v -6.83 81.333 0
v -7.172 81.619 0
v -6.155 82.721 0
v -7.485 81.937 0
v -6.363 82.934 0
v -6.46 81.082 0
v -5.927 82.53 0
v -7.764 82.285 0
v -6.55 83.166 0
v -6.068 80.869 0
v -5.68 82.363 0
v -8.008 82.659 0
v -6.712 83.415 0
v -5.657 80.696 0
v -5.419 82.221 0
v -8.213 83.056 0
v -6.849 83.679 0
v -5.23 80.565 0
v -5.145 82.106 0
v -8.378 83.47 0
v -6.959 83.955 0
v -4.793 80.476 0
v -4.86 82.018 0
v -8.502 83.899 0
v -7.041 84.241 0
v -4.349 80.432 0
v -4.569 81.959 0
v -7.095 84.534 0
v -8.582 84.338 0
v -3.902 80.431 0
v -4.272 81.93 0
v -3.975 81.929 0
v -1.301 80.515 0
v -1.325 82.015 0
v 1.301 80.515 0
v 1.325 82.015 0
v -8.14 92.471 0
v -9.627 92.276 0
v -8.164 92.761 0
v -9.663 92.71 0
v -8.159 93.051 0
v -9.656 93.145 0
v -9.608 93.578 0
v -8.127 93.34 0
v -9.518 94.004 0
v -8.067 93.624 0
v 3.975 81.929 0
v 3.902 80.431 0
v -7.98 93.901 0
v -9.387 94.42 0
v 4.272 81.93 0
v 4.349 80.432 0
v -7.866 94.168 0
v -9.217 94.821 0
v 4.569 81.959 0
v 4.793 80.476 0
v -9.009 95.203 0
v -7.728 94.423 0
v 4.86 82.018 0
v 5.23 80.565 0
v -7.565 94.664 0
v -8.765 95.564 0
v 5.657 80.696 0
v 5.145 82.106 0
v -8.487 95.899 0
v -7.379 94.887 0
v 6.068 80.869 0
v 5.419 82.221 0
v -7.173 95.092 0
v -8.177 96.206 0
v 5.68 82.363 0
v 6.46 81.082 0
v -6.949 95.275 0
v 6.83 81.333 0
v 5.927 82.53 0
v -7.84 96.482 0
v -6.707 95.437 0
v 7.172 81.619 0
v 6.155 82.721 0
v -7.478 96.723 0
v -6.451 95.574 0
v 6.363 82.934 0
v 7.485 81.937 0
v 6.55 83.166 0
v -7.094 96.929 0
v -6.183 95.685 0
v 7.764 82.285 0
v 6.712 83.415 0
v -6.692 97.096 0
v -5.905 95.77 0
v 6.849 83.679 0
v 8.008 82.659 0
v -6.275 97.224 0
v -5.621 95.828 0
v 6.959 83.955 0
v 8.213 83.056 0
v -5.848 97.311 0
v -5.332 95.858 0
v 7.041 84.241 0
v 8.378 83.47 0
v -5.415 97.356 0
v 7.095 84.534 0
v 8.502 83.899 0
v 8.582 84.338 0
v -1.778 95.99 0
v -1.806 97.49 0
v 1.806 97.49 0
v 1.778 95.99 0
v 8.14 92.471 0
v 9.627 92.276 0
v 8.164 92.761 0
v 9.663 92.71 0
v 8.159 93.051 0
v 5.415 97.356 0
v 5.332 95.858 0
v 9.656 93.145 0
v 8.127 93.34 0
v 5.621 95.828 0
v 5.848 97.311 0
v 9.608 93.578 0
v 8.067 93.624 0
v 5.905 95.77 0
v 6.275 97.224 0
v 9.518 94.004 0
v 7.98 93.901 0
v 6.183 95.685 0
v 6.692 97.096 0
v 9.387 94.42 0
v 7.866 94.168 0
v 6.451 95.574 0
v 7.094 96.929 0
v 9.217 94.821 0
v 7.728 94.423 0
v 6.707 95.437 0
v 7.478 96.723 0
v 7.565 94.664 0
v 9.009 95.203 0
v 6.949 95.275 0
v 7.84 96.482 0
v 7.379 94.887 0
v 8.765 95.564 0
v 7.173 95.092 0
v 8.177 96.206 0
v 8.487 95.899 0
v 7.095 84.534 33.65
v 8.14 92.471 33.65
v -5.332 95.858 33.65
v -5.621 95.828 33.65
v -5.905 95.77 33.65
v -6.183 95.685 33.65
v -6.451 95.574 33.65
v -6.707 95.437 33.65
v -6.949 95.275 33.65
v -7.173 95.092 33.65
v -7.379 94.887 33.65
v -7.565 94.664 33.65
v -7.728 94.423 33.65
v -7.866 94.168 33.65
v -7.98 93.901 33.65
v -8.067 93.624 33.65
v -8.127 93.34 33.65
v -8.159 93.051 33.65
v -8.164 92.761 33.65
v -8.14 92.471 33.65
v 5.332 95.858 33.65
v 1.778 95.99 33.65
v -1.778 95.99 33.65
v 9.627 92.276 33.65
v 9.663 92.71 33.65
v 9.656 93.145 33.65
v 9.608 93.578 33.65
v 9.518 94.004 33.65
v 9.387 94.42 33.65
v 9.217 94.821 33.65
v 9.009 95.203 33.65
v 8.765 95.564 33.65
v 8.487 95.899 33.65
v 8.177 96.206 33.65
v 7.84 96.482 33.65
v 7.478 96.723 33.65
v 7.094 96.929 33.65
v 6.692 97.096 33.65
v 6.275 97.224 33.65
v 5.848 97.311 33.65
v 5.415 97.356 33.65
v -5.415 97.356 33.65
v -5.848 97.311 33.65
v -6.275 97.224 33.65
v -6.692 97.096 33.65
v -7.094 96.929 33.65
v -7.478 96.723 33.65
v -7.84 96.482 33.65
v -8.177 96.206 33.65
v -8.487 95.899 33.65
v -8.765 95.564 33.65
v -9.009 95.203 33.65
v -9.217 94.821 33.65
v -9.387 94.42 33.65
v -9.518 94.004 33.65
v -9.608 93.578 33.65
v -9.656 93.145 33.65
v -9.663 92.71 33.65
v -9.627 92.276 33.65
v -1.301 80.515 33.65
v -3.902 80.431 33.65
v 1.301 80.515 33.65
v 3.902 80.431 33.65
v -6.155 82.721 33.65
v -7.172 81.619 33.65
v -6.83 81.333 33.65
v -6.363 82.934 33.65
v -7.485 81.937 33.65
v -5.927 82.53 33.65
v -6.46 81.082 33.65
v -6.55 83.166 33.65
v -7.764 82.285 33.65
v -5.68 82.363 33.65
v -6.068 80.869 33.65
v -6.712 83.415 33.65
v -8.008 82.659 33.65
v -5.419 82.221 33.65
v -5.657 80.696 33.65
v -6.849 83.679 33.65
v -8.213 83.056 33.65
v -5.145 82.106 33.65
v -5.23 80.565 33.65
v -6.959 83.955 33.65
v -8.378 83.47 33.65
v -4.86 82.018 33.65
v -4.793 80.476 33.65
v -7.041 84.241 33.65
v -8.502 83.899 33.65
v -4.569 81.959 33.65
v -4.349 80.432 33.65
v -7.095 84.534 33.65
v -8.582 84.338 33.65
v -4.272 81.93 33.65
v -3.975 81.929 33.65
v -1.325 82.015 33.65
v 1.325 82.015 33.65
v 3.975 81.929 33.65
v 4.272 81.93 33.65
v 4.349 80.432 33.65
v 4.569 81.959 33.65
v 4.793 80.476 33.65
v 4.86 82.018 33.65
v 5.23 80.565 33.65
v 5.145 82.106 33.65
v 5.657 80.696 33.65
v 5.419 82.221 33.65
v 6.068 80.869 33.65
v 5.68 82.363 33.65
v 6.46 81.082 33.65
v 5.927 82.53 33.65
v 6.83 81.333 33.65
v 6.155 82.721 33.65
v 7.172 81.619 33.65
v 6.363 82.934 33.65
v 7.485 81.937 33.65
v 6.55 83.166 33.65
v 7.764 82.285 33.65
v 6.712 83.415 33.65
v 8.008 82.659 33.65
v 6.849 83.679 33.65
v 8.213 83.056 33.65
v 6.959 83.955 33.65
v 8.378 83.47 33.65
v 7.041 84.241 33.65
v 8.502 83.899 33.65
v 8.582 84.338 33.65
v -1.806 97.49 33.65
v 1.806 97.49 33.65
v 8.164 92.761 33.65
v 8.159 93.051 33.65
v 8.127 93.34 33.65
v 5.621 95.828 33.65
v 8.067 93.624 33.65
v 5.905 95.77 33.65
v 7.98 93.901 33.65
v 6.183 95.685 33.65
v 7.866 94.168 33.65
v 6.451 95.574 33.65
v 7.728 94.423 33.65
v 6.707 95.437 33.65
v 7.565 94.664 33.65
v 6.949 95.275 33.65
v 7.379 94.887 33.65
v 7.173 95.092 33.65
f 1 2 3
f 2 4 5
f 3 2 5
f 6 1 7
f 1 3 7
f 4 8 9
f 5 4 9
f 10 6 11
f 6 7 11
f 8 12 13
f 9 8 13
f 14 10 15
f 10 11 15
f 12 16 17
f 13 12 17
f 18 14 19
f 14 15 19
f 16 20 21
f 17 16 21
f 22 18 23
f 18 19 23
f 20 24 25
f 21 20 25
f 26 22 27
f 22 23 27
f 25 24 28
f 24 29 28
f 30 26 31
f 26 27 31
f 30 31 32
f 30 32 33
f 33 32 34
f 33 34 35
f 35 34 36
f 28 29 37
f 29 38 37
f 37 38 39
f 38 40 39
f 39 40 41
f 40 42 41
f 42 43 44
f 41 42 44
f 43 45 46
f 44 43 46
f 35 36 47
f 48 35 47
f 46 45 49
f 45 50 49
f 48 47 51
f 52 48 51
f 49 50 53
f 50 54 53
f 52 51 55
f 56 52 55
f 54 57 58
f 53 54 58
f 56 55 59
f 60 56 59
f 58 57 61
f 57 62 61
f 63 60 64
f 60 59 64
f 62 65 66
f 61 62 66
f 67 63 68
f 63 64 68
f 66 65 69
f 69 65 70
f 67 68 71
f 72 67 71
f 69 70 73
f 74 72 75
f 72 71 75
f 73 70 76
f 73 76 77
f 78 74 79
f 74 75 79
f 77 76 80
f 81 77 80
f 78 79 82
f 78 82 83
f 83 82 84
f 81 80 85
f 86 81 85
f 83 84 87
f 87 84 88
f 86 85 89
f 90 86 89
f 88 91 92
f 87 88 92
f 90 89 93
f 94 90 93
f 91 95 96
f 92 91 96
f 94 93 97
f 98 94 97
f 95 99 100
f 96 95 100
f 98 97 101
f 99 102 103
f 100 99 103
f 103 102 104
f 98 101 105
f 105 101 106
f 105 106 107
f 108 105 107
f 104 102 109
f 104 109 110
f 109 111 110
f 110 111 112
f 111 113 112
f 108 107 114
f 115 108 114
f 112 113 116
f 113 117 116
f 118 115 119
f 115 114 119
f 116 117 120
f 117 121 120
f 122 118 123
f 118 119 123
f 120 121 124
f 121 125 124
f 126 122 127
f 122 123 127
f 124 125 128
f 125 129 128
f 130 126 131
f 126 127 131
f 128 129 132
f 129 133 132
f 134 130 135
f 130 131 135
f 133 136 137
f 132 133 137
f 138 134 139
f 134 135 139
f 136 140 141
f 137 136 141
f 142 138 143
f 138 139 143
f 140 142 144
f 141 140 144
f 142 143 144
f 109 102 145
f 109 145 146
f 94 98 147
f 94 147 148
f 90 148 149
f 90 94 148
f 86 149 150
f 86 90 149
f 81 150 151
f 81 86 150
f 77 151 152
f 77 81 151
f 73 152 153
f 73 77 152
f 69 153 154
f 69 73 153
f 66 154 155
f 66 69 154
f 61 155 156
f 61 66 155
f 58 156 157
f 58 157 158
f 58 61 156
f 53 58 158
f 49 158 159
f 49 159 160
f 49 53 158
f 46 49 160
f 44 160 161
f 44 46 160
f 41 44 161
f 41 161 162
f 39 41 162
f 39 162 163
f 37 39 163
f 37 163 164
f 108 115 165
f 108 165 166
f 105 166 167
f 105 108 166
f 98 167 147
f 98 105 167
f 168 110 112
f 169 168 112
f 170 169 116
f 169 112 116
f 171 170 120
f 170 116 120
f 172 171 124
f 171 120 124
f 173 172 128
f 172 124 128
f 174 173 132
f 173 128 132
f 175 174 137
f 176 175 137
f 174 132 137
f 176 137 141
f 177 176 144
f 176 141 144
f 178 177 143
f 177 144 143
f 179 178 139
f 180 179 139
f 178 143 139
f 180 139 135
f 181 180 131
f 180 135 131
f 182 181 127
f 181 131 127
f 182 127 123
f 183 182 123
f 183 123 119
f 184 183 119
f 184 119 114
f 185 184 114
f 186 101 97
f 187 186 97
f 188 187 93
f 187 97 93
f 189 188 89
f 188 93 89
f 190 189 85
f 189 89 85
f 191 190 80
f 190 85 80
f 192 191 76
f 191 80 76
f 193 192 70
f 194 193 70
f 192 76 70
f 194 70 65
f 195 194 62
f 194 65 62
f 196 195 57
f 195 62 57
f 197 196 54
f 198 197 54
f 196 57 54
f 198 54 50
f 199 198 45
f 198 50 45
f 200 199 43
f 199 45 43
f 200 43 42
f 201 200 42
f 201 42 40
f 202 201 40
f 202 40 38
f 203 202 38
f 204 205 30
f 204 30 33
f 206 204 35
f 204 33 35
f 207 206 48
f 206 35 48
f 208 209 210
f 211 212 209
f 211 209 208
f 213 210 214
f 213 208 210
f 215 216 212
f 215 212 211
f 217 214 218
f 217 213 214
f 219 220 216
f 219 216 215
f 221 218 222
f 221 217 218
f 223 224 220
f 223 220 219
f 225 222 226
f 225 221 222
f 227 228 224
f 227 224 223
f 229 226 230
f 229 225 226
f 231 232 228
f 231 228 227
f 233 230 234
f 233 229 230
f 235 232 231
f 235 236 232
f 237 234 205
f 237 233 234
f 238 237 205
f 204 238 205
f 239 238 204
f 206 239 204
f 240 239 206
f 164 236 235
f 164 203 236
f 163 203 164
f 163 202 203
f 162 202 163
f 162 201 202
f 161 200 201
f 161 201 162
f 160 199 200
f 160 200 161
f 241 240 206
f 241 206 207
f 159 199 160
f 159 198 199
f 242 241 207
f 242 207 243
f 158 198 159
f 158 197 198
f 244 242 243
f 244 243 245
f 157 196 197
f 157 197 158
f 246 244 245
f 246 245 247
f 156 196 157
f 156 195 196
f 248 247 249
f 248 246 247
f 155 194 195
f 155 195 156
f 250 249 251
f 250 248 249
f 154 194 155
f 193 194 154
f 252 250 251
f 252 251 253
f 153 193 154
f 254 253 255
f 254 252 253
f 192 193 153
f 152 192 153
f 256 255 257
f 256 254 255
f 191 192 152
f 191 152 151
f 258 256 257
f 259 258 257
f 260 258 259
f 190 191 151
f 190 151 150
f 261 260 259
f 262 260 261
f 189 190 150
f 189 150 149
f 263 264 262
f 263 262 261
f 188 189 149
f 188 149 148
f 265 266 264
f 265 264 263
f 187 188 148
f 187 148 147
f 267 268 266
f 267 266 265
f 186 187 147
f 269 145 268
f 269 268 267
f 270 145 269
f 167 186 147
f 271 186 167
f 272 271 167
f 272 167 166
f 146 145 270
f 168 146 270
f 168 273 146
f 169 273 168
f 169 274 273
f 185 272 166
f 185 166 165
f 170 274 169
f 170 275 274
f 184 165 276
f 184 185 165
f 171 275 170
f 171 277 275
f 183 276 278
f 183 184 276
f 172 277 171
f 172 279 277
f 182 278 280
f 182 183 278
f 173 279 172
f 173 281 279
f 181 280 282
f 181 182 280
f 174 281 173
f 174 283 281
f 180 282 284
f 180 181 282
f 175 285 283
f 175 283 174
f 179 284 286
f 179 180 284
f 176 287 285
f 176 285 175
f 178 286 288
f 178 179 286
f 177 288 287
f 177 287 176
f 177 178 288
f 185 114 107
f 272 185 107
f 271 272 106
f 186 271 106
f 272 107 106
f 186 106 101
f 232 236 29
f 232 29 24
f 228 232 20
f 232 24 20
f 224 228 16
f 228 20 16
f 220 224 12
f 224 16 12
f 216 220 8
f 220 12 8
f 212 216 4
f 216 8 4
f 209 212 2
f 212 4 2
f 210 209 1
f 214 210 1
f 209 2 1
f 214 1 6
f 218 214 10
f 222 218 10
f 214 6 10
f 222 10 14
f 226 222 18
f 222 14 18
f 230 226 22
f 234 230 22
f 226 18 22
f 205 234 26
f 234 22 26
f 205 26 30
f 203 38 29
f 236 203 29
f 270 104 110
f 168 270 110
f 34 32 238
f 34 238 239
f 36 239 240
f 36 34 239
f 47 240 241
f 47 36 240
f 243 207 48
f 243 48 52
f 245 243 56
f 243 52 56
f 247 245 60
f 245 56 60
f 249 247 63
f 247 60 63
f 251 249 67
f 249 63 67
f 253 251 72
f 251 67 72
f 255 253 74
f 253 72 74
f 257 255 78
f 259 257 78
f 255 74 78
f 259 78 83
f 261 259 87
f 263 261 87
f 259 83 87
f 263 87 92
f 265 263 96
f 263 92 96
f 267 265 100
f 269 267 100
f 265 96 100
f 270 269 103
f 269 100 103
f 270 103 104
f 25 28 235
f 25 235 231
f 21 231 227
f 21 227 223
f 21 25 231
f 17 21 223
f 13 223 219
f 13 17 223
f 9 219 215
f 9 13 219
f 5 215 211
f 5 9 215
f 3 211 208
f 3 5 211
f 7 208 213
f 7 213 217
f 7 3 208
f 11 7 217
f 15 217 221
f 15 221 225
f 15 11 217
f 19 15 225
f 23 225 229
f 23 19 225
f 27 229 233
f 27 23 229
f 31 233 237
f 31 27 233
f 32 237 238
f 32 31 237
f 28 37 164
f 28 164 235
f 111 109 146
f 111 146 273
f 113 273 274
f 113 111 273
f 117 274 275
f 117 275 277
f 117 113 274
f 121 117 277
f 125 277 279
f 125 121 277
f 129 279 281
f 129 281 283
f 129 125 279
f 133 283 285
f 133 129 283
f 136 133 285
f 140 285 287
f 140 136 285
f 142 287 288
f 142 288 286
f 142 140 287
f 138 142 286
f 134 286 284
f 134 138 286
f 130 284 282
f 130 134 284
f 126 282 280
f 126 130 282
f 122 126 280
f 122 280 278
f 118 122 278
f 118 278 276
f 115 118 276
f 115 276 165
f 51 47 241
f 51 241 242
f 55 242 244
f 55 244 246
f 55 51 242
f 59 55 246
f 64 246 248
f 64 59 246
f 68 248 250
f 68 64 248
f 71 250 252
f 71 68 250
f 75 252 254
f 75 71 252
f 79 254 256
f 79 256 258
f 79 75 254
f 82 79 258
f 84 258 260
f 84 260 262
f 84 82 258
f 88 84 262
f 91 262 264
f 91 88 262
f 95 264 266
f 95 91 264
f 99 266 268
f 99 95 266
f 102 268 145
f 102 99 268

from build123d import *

# Parameters (mm, degrees)
BOSS_EXTRUDE1_DEPTH = 33.65


with BuildPart() as part:
    # Sketch1 → Boss-Extrude1 (new body)
    with BuildSketch(Plane.XY):
        with BuildLine():
            Line((8.581782676, 84.338354997), (9.626750626, 92.275674602))
            ThreePointArc((9.626750626, 92.275674602), (8.629643832, 95.734969819), (5.415162452, 97.356097457))
            ThreePointArc((5.415162452, 97.356097457), (0, 97.506582836), (-5.415162452, 97.356097457))
            ThreePointArc((-5.415162452, 97.356097457), (-8.629643832, 95.734969819), (-9.626750626, 92.275674602))
            Line((-9.626750626, 92.275674602), (-8.581782676, 84.338354997))
            ThreePointArc((-8.581782676, 84.338354997), (-7.004465647, 81.471525738), (-3.902214001, 80.431009648))
            ThreePointArc((-3.902214001, 80.431009648), (0, 80.525614479), (3.902214001, 80.431009648))
            ThreePointArc((3.902214001, 80.431009648), (7.004465647, 81.471525738), (8.581782676, 84.338354997))
        make_face()
        with BuildLine():
            Line((-8.139583334, 92.47146389), (-7.094615384, 84.534144285))
            ThreePointArc((-7.094615384, 84.534144285), (-6.043070698, 82.622924779), (-3.974902934, 81.929247386))
            ThreePointArc((-3.974902934, 81.929247386), (0, 82.025614479), (3.974902934, 81.929247386))
            ThreePointArc((3.974902934, 81.929247386), (6.043070698, 82.622924779), (7.094615384, 84.534144285))
            Line((7.094615384, 84.534144285), (8.139583334, 92.47146389))
            ThreePointArc((8.139583334, 92.47146389), (7.474845471, 94.777660702), (5.331857885, 95.85841246))
            ThreePointArc((5.331857885, 95.85841246), (0, 96.006582836), (-5.331857885, 95.85841246))
            ThreePointArc((-5.331857885, 95.85841246), (-7.474845471, 94.777660702), (-8.139583334, 92.47146389))
        make_face(mode=Mode.SUBTRACT)
    extrude(amount=BOSS_EXTRUDE1_DEPTH)


solid = part.part
